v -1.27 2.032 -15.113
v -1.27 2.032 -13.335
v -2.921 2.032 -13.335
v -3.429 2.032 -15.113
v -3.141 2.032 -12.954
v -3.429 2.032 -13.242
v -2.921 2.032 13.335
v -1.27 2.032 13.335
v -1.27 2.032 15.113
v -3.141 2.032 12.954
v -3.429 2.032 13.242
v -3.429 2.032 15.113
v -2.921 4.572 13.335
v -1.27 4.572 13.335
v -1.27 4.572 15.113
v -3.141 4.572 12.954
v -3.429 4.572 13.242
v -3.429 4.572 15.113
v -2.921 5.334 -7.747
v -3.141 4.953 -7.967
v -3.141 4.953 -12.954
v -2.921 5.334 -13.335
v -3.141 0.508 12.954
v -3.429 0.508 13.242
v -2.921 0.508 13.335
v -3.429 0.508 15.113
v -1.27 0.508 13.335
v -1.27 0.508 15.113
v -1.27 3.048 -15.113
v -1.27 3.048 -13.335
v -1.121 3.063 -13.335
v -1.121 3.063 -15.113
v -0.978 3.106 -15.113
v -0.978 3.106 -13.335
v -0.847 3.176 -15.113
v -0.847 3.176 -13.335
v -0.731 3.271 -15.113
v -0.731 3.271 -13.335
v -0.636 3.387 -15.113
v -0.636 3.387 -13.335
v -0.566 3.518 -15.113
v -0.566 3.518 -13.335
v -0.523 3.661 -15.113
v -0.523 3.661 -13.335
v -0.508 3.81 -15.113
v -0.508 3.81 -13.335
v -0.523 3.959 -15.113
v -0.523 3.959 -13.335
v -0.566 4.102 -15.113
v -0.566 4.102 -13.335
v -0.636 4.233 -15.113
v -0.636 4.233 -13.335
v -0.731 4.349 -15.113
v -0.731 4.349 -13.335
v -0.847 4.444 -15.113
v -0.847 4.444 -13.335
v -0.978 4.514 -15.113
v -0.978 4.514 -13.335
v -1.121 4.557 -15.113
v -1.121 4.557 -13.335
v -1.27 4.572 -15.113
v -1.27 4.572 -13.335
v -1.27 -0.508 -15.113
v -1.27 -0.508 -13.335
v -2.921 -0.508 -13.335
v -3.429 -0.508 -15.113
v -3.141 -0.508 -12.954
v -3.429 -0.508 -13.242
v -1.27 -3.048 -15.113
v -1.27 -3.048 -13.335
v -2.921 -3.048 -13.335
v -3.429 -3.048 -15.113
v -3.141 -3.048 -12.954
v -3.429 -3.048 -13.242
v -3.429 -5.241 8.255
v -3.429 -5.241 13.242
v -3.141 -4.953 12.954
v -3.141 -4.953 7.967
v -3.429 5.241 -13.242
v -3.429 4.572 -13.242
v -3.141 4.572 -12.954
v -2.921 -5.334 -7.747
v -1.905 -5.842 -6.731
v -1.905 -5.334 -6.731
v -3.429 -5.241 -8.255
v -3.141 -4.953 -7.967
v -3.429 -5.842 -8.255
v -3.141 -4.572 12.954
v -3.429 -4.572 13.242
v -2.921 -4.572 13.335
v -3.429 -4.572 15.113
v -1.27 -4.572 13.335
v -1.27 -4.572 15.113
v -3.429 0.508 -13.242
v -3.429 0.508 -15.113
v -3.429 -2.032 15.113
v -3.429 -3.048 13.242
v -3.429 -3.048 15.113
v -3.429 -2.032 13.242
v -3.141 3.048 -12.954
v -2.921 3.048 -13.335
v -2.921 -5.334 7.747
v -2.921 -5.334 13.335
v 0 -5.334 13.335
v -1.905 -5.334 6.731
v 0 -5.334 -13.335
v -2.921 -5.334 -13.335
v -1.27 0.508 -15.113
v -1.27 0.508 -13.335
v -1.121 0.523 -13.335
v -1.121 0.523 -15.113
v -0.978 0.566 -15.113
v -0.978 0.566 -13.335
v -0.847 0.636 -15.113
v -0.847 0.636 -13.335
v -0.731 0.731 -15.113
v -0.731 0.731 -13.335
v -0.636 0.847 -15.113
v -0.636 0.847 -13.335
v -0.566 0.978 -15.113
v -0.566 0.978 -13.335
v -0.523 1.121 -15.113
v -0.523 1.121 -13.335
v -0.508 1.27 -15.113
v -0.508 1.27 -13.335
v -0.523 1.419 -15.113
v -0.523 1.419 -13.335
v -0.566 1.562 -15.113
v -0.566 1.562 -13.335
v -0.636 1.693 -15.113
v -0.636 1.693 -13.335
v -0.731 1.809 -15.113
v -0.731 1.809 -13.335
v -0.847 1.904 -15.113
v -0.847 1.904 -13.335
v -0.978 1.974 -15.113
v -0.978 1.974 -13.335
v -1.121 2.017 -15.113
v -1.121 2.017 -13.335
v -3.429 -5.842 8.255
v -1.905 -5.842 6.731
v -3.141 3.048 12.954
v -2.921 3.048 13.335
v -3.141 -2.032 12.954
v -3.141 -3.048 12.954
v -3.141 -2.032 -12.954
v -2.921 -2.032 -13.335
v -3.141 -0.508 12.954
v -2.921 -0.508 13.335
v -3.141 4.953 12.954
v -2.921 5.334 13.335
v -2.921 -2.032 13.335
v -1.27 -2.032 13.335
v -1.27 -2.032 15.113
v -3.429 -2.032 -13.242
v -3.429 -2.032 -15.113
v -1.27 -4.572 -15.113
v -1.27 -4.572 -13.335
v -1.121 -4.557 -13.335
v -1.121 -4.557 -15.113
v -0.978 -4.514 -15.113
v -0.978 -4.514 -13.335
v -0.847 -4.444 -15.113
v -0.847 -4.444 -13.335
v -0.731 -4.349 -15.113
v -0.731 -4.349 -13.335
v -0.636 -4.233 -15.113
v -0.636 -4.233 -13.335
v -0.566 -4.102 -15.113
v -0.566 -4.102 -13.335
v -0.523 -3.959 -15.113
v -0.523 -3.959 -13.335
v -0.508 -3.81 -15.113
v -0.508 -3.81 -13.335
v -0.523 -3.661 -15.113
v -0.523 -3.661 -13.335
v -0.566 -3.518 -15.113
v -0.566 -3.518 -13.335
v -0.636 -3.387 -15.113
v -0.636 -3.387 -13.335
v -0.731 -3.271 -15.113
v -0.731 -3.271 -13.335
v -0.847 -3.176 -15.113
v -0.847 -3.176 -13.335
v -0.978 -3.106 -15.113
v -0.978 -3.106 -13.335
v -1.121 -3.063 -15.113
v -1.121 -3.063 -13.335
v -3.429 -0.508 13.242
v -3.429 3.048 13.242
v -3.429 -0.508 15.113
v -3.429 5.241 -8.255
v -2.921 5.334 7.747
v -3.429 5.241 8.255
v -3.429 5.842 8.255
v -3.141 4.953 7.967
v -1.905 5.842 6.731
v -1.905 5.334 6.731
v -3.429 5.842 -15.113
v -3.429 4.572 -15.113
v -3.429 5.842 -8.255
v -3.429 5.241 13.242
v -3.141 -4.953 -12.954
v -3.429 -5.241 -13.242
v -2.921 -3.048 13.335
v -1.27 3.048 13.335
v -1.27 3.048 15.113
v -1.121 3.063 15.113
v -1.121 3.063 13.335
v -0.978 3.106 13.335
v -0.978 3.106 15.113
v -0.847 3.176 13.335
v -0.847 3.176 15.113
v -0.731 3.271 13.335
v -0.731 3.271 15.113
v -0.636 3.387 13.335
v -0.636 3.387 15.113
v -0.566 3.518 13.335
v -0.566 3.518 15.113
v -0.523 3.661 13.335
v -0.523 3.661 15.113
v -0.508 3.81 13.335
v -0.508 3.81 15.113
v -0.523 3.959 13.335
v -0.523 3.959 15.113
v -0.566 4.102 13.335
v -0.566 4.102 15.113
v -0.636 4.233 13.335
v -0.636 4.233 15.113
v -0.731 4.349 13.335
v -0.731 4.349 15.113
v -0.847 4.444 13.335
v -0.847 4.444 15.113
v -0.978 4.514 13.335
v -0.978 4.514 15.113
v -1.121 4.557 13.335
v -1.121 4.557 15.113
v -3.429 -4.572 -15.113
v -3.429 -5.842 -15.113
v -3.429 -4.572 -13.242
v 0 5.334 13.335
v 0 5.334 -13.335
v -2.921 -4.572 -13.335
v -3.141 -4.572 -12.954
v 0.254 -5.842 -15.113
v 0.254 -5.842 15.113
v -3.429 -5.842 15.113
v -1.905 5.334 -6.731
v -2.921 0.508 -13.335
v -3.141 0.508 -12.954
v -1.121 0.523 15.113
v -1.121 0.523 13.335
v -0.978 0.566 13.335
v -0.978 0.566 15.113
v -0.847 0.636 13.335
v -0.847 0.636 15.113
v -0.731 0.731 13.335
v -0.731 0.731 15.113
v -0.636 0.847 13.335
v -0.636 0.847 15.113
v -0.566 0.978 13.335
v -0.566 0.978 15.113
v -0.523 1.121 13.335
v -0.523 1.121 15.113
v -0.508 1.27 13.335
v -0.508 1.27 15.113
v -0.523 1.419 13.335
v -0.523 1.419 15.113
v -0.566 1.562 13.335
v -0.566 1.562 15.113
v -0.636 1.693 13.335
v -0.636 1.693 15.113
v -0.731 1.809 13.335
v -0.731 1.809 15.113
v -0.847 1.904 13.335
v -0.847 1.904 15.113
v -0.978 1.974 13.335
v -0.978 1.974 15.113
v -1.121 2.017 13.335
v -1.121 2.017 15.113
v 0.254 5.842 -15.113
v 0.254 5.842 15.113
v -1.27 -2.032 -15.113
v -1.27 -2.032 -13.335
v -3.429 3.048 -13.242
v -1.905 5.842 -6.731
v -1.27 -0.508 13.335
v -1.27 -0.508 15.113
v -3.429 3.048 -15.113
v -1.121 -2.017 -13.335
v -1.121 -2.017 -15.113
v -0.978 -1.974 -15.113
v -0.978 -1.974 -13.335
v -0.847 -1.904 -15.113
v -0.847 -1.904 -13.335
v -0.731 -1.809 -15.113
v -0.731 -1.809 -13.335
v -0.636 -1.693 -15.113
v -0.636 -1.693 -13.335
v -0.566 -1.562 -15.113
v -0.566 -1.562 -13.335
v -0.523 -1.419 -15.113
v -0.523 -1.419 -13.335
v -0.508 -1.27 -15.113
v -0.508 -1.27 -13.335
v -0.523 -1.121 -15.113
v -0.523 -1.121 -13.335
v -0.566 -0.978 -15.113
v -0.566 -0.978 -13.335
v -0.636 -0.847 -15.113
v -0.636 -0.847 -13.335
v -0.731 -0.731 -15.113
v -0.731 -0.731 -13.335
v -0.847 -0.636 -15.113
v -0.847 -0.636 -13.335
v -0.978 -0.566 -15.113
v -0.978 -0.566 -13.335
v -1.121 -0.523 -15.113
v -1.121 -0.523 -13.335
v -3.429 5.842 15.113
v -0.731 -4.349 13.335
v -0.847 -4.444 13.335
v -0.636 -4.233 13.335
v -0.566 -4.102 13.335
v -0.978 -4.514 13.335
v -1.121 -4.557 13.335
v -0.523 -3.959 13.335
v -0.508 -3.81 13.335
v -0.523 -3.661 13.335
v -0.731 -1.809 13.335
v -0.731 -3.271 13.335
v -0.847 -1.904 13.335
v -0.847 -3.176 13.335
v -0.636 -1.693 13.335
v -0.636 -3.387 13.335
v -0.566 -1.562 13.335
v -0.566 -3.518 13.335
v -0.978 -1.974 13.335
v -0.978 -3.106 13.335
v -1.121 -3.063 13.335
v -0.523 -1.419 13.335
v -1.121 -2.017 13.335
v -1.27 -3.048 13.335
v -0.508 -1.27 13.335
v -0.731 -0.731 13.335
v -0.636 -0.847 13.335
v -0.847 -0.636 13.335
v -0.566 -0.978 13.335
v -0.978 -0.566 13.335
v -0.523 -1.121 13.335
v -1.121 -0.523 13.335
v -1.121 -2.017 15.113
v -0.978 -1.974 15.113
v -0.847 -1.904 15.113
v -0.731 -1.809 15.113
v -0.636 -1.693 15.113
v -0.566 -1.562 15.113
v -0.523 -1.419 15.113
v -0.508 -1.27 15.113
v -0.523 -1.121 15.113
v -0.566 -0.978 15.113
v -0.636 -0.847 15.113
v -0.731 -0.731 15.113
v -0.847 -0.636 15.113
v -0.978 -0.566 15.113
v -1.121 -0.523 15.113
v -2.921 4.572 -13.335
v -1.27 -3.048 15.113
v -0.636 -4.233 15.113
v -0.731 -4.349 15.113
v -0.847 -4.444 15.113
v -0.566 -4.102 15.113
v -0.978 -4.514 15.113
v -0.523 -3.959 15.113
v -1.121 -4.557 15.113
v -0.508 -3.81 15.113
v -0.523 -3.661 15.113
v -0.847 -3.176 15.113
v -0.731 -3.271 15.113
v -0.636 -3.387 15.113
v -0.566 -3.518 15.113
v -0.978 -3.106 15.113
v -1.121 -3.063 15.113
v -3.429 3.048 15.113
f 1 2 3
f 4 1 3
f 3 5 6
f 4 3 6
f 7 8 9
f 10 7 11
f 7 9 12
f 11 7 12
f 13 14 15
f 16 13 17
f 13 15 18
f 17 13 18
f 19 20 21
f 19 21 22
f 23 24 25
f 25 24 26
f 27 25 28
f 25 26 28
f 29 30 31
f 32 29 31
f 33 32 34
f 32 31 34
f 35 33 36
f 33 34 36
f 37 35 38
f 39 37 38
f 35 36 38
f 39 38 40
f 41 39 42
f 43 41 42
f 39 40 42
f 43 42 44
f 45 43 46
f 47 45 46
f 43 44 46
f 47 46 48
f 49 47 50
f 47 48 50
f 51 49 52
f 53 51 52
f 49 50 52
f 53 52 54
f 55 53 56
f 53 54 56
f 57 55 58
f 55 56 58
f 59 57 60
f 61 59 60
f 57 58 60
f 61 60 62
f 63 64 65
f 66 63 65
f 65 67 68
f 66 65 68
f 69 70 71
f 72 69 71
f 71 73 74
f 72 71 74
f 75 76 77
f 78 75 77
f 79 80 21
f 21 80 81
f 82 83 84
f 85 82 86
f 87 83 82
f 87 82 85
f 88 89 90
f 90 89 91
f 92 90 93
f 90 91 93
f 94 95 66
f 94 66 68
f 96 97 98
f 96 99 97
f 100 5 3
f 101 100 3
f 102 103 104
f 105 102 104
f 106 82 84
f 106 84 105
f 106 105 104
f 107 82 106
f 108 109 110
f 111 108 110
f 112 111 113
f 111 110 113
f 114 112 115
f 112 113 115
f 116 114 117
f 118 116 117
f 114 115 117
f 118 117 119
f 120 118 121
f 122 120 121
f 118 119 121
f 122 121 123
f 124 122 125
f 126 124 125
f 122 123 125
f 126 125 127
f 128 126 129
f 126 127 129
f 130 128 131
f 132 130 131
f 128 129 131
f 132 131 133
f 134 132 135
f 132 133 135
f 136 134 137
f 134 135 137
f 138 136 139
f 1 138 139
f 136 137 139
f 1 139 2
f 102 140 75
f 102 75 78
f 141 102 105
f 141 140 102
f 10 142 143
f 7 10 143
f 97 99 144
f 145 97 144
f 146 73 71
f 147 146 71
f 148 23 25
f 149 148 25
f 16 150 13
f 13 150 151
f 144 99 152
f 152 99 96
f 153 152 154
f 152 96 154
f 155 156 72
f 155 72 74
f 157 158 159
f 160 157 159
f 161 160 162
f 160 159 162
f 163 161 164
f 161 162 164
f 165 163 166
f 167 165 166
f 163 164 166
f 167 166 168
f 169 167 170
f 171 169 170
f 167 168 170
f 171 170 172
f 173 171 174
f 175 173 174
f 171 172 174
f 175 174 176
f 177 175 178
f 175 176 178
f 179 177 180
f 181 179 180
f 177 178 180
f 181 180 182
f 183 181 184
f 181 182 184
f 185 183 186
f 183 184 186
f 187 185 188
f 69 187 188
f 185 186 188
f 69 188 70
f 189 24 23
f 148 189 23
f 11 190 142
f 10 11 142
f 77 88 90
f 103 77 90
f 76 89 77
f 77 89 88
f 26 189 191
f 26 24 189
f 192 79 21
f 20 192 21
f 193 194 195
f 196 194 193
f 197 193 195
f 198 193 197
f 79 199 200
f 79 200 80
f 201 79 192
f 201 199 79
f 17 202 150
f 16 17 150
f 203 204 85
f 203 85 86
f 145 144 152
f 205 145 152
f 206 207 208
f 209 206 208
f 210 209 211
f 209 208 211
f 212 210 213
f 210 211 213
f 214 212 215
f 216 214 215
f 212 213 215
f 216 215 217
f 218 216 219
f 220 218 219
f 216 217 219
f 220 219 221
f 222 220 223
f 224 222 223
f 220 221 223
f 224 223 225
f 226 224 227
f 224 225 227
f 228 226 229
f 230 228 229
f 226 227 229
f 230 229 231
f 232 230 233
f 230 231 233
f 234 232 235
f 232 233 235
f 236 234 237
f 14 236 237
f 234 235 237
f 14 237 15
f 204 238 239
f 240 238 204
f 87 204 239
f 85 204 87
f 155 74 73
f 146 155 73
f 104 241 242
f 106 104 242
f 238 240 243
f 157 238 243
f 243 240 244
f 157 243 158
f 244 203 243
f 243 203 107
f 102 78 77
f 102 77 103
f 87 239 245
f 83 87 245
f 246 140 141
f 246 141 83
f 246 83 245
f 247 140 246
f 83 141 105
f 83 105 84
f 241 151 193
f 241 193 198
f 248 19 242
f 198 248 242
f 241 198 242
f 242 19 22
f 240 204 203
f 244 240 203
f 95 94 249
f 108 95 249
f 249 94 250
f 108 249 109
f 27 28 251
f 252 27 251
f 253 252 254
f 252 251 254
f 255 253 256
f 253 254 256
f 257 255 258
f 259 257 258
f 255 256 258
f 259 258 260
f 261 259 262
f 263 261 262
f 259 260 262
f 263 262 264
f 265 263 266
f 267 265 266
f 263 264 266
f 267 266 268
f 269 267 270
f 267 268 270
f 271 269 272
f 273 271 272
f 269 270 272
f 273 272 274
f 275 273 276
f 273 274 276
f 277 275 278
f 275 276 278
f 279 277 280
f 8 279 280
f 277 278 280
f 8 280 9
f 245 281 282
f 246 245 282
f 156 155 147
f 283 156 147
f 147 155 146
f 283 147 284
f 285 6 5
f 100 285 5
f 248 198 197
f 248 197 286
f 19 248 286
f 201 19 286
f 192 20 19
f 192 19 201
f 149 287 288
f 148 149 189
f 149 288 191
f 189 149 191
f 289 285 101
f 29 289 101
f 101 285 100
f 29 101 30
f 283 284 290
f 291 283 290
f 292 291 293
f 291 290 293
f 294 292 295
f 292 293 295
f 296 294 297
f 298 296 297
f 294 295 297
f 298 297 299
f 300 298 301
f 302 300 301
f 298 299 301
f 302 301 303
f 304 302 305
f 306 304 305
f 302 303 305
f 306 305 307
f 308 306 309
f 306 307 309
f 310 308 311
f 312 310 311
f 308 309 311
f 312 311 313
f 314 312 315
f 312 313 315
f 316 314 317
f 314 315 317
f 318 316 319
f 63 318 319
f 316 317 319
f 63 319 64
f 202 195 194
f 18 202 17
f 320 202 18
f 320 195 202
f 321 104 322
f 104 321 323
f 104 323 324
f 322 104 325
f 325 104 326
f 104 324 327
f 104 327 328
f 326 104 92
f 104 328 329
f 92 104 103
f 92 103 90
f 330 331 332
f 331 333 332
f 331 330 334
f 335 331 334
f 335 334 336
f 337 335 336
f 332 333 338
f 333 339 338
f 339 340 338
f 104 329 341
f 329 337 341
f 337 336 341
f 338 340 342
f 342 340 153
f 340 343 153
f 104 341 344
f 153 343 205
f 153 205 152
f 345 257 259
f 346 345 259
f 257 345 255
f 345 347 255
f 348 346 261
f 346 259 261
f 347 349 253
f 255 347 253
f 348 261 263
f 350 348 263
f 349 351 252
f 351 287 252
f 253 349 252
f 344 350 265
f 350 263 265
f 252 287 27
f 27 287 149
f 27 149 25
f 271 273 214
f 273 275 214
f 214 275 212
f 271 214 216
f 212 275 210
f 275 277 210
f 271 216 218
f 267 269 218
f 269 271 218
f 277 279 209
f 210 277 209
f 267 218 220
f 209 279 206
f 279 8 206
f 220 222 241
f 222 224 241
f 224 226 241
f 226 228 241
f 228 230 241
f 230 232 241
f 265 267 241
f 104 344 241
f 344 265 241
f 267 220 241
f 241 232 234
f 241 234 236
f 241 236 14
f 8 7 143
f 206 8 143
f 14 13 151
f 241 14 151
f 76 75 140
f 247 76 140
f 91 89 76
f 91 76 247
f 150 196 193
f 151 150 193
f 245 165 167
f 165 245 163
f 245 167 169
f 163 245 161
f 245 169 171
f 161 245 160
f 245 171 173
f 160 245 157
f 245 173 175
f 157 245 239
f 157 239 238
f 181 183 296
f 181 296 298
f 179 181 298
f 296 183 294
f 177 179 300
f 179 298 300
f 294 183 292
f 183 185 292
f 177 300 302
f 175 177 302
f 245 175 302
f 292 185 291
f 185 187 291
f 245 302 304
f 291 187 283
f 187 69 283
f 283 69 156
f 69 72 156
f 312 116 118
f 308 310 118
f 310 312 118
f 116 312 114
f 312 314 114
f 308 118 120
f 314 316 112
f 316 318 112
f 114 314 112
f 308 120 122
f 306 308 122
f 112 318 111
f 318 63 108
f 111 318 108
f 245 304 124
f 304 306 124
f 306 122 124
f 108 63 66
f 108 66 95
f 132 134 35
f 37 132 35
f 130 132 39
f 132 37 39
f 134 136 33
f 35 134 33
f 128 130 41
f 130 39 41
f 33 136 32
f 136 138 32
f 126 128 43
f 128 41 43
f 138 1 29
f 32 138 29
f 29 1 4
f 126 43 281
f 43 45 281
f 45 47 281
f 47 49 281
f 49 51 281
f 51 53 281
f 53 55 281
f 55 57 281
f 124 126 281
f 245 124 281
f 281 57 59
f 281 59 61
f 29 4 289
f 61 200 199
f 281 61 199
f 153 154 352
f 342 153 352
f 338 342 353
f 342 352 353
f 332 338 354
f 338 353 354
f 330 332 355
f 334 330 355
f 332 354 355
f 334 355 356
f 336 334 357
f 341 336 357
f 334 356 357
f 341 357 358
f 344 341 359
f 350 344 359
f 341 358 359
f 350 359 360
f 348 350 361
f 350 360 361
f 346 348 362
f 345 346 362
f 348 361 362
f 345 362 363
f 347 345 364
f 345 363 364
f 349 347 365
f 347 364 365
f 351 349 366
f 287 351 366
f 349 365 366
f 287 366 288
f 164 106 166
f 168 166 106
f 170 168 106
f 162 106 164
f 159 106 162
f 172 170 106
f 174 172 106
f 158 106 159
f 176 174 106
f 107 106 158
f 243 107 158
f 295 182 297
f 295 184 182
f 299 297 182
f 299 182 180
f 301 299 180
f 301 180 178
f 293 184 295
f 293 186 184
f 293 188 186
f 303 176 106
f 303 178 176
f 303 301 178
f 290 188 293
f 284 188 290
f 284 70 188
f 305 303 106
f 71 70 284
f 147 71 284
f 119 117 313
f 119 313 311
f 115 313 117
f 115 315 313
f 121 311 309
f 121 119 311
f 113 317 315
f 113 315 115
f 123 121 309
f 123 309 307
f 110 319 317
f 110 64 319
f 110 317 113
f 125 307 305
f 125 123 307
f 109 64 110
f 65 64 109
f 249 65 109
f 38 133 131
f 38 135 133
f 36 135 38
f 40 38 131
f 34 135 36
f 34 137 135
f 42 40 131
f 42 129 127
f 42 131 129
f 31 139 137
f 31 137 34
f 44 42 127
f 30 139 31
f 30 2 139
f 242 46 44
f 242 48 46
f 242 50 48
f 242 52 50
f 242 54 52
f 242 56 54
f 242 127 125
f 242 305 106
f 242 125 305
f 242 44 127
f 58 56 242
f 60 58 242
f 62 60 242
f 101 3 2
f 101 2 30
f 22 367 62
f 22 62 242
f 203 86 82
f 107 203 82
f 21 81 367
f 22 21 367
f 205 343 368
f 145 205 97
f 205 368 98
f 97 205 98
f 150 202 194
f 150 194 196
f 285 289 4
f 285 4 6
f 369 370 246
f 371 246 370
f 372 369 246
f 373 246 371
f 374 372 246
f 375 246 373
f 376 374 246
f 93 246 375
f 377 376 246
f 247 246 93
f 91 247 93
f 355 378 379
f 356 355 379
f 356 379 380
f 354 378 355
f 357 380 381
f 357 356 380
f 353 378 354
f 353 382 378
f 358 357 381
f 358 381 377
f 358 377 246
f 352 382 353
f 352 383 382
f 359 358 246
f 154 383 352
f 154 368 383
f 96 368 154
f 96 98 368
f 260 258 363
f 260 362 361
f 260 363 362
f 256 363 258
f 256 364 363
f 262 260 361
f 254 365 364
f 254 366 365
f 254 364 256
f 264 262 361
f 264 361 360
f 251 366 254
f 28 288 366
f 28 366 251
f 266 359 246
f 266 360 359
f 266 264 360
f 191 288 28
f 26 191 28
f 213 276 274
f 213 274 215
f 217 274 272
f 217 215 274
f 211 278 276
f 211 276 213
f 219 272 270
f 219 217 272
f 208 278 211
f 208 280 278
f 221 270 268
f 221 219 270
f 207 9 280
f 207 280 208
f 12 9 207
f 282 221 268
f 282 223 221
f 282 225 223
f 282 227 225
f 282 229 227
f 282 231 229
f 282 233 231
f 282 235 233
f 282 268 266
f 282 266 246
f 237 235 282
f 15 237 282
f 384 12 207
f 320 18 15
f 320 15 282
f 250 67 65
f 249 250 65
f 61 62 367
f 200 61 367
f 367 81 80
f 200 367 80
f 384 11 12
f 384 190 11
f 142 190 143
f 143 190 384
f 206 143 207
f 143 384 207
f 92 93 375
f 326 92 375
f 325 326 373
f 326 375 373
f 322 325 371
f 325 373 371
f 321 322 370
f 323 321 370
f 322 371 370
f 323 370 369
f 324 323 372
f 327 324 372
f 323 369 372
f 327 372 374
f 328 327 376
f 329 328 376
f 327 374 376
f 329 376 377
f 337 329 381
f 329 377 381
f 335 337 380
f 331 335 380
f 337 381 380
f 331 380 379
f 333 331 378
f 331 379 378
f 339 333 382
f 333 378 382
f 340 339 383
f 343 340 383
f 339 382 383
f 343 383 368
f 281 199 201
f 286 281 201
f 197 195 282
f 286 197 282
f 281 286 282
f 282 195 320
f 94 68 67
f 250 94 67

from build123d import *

# Parameters (mm, degrees)
SKETCH1_W                = 26.67
SKETCH1_H                = 10.668
BOSS_EXTRUDE1_DEPTH      = 0.254
EXTRUDE_THIN1_DEPTH      = 0.254
EXTRUDE_THIN1_DEPTH_BACK = 2.921
SKETCH1_3_W              = 27.686
SKETCH1_3_H              = 11.684
SKETCH1_3_W_2            = 26.67
SKETCH1_3_H_2            = 10.668
SKETCH5_W                = 1.27
SKETCH5_H                = 11.684
BOSS_EXTRUDE2_DEPTH      = 3.683
CUT_EXTRUDE1_DEPTH       = 31.975766028
LPATTERN1_COUNT          = 4
LPATTERN1_PITCH          = 2.54
CUT_EXTRUDE2_DEPTH       = 20.408159779


with BuildPart() as part:
    # Sketch1 → Boss-Extrude1 (new body)
    with BuildSketch(Plane(origin=(0, 0, 0), x_dir=(0, 0, -1), z_dir=(1, 0, 0))):
        Rectangle(SKETCH1_W, SKETCH1_H)
    extrude(amount=BOSS_EXTRUDE1_DEPTH)

    # Sketch1<3> → Extrude-Thin1 (add, two sides: drawn at the far end of the back side and taken through both)
    with BuildSketch(Plane(origin=(0, 0, 0), x_dir=(0, 0, -1), z_dir=(1, 0, 0)).offset(-EXTRUDE_THIN1_DEPTH_BACK)):
        Rectangle(SKETCH1_3_W, SKETCH1_3_H)
        Rectangle(SKETCH1_3_W_2, SKETCH1_3_H_2, mode=Mode.SUBTRACT)
    extrude(amount=EXTRUDE_THIN1_DEPTH + EXTRUDE_THIN1_DEPTH_BACK)

    # Sweep1: sweep along a path in Sketch2
    with BuildLine(Plane.ZY.offset(2.921)) as sweep1_path:
        Line((-13.335, -5.334), (13.335, -5.334))
        Line((13.335, -5.334), (13.335, 5.334))
        Line((13.335, 5.334), (-13.335, 5.334))
        Line((-13.335, 5.334), (-13.335, -5.334))
    # Sketch3 → Sweep1 (sweep)
    with BuildSketch(Plane(origin=(0, 0, 0), x_dir=(-1, 0, 0), z_dir=(0, -1, 0))):
        Polygon((2.921, -13.335), (3.140970453, -12.954), (3.429, -13.242029547), (3.429, -13.843), (2.921, -13.843), align=None)
    sweep(path=sweep1_path.line, transition=Transition.RIGHT)

    # Sketch5 → Boss-Extrude2 (add)
    with BuildSketch(Plane.ZY.offset(3.429)):
        with Locations((-14.478, 0)):
            Rectangle(SKETCH5_W, SKETCH5_H)
        with Locations((14.478, 0)):
            Rectangle(SKETCH5_W, SKETCH5_H)
    extrude(amount=-BOSS_EXTRUDE2_DEPTH)

    # Sketch4 → Cut-Extrude1 (cut, symmetric)
    with BuildSketch(Plane.XY.offset(15.113)):
        with BuildLine():
            Line((-1.27, 4.572), (-3.429, 4.572))
            Line((-3.429, 4.572), (-3.429, 3.048))
            Line((-3.429, 3.048), (-1.27, 3.048))
            ThreePointArc((-1.27, 3.048), (-0.508, 3.81), (-1.27, 4.572))
        make_face()
    cut_extrude1 = extrude(amount=CUT_EXTRUDE1_DEPTH, both=True, mode=Mode.SUBTRACT)

    # LPattern1: Cut-Extrude1 ×4
    with Locations(*[(0, -i * LPATTERN1_PITCH, 0) for i in range(1, LPATTERN1_COUNT)]):
        add(cut_extrude1, mode=Mode.SUBTRACT)

    # Sketch7 → Cut-Extrude2 (cut, through all)
    with BuildSketch(Plane.XZ.offset(5.842)):
        Polygon((-3.429, 8.255), (-1.905, 6.731), (-1.905, -6.731), (-3.429, -8.255), align=None)
    extrude(amount=-CUT_EXTRUDE2_DEPTH, mode=Mode.SUBTRACT)


solid = part.part
